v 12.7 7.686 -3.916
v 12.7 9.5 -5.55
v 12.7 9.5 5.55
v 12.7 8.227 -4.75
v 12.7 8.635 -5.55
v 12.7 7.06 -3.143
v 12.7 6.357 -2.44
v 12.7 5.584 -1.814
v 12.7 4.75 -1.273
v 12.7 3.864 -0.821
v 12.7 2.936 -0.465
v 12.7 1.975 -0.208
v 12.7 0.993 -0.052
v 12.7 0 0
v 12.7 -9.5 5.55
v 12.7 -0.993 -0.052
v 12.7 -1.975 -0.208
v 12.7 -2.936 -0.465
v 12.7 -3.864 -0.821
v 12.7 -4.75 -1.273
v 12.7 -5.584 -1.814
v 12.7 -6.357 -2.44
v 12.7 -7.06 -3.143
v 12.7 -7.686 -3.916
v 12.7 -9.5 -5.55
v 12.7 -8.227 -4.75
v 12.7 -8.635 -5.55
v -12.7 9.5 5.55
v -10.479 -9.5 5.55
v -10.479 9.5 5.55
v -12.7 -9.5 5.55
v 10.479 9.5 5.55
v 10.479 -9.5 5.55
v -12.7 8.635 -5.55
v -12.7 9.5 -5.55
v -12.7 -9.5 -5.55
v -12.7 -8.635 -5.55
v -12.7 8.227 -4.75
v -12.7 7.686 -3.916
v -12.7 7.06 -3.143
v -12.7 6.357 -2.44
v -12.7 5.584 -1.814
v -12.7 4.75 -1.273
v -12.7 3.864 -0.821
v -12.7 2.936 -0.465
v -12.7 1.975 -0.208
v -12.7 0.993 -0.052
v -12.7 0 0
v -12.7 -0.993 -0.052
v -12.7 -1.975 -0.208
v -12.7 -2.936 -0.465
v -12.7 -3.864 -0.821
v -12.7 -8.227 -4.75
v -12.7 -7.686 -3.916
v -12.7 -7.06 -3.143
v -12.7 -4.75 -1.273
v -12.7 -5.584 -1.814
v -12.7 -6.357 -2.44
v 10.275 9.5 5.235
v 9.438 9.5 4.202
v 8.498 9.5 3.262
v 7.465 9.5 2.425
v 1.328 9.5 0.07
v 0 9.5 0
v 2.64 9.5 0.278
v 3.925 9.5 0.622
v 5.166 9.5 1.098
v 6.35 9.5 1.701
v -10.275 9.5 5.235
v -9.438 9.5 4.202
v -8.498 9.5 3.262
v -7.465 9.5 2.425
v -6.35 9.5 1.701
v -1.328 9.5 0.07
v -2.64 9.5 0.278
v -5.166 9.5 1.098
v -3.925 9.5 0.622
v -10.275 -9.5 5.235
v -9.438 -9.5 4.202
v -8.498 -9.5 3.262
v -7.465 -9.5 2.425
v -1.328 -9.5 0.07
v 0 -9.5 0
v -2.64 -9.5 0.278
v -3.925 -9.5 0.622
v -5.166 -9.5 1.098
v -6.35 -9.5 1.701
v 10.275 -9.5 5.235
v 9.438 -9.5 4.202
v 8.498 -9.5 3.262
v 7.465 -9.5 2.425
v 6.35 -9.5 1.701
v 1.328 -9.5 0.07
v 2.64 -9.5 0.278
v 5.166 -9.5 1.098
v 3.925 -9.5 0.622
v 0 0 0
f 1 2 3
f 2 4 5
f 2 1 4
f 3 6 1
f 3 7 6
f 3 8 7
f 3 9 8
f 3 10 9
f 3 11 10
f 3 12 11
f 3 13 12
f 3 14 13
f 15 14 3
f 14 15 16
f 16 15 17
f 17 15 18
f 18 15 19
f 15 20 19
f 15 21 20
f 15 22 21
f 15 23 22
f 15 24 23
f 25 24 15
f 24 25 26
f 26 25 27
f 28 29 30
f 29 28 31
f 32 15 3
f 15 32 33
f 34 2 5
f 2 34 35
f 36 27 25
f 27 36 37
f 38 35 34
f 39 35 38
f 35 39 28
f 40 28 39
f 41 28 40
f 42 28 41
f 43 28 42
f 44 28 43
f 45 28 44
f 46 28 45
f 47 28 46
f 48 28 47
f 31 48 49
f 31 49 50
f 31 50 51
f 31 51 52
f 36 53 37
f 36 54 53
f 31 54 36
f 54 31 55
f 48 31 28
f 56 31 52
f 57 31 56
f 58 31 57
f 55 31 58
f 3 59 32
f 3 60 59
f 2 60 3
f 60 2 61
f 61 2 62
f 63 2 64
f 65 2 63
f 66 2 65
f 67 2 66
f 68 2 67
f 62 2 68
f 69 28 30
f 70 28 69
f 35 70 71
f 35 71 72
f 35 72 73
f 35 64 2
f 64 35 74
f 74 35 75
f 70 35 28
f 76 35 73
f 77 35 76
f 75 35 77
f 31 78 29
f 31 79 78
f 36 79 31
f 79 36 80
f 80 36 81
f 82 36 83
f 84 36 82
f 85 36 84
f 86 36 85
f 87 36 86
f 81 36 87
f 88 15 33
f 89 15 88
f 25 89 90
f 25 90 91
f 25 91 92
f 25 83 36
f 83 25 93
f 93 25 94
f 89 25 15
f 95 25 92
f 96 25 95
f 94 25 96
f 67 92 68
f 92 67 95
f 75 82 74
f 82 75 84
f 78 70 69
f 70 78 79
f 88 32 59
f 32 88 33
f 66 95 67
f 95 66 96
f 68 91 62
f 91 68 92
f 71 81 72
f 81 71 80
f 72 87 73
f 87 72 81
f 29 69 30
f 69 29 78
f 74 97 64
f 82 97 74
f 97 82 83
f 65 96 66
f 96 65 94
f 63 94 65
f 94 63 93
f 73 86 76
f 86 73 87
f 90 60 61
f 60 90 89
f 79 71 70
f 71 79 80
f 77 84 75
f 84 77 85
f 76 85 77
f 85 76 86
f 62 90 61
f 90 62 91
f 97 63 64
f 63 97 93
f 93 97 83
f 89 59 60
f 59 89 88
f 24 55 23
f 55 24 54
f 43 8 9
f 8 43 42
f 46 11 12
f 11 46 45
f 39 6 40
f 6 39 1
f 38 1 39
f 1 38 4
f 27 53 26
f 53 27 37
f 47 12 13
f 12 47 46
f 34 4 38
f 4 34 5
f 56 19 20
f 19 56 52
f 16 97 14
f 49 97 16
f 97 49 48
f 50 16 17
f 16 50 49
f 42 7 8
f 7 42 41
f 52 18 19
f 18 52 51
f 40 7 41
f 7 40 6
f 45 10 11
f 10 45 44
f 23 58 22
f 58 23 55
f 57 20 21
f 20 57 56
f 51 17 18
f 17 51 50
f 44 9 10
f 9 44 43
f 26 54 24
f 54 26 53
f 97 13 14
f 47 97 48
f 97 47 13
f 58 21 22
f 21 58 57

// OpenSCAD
$fn=60;

mount_pipe_diameter = 25.4; // 1 inch
vane_pipe_diameter = 19;


difference(){
    cube([mount_pipe_diameter, vane_pipe_diameter,( mount_pipe_diameter+vane_pipe_diameter)/4], center= true);
    translate([0, 0, mount_pipe_diameter/2])
        rotate([90, 0, 0])
            cylinder(r=mount_pipe_diameter/2, h=vane_pipe_diameter+1,center=true);
    translate([0, 0, -vane_pipe_diameter/2])
        rotate([0, 90, 0])
            cylinder(r=vane_pipe_diameter/2, h=mount_pipe_diameter+1,center=true);
}
